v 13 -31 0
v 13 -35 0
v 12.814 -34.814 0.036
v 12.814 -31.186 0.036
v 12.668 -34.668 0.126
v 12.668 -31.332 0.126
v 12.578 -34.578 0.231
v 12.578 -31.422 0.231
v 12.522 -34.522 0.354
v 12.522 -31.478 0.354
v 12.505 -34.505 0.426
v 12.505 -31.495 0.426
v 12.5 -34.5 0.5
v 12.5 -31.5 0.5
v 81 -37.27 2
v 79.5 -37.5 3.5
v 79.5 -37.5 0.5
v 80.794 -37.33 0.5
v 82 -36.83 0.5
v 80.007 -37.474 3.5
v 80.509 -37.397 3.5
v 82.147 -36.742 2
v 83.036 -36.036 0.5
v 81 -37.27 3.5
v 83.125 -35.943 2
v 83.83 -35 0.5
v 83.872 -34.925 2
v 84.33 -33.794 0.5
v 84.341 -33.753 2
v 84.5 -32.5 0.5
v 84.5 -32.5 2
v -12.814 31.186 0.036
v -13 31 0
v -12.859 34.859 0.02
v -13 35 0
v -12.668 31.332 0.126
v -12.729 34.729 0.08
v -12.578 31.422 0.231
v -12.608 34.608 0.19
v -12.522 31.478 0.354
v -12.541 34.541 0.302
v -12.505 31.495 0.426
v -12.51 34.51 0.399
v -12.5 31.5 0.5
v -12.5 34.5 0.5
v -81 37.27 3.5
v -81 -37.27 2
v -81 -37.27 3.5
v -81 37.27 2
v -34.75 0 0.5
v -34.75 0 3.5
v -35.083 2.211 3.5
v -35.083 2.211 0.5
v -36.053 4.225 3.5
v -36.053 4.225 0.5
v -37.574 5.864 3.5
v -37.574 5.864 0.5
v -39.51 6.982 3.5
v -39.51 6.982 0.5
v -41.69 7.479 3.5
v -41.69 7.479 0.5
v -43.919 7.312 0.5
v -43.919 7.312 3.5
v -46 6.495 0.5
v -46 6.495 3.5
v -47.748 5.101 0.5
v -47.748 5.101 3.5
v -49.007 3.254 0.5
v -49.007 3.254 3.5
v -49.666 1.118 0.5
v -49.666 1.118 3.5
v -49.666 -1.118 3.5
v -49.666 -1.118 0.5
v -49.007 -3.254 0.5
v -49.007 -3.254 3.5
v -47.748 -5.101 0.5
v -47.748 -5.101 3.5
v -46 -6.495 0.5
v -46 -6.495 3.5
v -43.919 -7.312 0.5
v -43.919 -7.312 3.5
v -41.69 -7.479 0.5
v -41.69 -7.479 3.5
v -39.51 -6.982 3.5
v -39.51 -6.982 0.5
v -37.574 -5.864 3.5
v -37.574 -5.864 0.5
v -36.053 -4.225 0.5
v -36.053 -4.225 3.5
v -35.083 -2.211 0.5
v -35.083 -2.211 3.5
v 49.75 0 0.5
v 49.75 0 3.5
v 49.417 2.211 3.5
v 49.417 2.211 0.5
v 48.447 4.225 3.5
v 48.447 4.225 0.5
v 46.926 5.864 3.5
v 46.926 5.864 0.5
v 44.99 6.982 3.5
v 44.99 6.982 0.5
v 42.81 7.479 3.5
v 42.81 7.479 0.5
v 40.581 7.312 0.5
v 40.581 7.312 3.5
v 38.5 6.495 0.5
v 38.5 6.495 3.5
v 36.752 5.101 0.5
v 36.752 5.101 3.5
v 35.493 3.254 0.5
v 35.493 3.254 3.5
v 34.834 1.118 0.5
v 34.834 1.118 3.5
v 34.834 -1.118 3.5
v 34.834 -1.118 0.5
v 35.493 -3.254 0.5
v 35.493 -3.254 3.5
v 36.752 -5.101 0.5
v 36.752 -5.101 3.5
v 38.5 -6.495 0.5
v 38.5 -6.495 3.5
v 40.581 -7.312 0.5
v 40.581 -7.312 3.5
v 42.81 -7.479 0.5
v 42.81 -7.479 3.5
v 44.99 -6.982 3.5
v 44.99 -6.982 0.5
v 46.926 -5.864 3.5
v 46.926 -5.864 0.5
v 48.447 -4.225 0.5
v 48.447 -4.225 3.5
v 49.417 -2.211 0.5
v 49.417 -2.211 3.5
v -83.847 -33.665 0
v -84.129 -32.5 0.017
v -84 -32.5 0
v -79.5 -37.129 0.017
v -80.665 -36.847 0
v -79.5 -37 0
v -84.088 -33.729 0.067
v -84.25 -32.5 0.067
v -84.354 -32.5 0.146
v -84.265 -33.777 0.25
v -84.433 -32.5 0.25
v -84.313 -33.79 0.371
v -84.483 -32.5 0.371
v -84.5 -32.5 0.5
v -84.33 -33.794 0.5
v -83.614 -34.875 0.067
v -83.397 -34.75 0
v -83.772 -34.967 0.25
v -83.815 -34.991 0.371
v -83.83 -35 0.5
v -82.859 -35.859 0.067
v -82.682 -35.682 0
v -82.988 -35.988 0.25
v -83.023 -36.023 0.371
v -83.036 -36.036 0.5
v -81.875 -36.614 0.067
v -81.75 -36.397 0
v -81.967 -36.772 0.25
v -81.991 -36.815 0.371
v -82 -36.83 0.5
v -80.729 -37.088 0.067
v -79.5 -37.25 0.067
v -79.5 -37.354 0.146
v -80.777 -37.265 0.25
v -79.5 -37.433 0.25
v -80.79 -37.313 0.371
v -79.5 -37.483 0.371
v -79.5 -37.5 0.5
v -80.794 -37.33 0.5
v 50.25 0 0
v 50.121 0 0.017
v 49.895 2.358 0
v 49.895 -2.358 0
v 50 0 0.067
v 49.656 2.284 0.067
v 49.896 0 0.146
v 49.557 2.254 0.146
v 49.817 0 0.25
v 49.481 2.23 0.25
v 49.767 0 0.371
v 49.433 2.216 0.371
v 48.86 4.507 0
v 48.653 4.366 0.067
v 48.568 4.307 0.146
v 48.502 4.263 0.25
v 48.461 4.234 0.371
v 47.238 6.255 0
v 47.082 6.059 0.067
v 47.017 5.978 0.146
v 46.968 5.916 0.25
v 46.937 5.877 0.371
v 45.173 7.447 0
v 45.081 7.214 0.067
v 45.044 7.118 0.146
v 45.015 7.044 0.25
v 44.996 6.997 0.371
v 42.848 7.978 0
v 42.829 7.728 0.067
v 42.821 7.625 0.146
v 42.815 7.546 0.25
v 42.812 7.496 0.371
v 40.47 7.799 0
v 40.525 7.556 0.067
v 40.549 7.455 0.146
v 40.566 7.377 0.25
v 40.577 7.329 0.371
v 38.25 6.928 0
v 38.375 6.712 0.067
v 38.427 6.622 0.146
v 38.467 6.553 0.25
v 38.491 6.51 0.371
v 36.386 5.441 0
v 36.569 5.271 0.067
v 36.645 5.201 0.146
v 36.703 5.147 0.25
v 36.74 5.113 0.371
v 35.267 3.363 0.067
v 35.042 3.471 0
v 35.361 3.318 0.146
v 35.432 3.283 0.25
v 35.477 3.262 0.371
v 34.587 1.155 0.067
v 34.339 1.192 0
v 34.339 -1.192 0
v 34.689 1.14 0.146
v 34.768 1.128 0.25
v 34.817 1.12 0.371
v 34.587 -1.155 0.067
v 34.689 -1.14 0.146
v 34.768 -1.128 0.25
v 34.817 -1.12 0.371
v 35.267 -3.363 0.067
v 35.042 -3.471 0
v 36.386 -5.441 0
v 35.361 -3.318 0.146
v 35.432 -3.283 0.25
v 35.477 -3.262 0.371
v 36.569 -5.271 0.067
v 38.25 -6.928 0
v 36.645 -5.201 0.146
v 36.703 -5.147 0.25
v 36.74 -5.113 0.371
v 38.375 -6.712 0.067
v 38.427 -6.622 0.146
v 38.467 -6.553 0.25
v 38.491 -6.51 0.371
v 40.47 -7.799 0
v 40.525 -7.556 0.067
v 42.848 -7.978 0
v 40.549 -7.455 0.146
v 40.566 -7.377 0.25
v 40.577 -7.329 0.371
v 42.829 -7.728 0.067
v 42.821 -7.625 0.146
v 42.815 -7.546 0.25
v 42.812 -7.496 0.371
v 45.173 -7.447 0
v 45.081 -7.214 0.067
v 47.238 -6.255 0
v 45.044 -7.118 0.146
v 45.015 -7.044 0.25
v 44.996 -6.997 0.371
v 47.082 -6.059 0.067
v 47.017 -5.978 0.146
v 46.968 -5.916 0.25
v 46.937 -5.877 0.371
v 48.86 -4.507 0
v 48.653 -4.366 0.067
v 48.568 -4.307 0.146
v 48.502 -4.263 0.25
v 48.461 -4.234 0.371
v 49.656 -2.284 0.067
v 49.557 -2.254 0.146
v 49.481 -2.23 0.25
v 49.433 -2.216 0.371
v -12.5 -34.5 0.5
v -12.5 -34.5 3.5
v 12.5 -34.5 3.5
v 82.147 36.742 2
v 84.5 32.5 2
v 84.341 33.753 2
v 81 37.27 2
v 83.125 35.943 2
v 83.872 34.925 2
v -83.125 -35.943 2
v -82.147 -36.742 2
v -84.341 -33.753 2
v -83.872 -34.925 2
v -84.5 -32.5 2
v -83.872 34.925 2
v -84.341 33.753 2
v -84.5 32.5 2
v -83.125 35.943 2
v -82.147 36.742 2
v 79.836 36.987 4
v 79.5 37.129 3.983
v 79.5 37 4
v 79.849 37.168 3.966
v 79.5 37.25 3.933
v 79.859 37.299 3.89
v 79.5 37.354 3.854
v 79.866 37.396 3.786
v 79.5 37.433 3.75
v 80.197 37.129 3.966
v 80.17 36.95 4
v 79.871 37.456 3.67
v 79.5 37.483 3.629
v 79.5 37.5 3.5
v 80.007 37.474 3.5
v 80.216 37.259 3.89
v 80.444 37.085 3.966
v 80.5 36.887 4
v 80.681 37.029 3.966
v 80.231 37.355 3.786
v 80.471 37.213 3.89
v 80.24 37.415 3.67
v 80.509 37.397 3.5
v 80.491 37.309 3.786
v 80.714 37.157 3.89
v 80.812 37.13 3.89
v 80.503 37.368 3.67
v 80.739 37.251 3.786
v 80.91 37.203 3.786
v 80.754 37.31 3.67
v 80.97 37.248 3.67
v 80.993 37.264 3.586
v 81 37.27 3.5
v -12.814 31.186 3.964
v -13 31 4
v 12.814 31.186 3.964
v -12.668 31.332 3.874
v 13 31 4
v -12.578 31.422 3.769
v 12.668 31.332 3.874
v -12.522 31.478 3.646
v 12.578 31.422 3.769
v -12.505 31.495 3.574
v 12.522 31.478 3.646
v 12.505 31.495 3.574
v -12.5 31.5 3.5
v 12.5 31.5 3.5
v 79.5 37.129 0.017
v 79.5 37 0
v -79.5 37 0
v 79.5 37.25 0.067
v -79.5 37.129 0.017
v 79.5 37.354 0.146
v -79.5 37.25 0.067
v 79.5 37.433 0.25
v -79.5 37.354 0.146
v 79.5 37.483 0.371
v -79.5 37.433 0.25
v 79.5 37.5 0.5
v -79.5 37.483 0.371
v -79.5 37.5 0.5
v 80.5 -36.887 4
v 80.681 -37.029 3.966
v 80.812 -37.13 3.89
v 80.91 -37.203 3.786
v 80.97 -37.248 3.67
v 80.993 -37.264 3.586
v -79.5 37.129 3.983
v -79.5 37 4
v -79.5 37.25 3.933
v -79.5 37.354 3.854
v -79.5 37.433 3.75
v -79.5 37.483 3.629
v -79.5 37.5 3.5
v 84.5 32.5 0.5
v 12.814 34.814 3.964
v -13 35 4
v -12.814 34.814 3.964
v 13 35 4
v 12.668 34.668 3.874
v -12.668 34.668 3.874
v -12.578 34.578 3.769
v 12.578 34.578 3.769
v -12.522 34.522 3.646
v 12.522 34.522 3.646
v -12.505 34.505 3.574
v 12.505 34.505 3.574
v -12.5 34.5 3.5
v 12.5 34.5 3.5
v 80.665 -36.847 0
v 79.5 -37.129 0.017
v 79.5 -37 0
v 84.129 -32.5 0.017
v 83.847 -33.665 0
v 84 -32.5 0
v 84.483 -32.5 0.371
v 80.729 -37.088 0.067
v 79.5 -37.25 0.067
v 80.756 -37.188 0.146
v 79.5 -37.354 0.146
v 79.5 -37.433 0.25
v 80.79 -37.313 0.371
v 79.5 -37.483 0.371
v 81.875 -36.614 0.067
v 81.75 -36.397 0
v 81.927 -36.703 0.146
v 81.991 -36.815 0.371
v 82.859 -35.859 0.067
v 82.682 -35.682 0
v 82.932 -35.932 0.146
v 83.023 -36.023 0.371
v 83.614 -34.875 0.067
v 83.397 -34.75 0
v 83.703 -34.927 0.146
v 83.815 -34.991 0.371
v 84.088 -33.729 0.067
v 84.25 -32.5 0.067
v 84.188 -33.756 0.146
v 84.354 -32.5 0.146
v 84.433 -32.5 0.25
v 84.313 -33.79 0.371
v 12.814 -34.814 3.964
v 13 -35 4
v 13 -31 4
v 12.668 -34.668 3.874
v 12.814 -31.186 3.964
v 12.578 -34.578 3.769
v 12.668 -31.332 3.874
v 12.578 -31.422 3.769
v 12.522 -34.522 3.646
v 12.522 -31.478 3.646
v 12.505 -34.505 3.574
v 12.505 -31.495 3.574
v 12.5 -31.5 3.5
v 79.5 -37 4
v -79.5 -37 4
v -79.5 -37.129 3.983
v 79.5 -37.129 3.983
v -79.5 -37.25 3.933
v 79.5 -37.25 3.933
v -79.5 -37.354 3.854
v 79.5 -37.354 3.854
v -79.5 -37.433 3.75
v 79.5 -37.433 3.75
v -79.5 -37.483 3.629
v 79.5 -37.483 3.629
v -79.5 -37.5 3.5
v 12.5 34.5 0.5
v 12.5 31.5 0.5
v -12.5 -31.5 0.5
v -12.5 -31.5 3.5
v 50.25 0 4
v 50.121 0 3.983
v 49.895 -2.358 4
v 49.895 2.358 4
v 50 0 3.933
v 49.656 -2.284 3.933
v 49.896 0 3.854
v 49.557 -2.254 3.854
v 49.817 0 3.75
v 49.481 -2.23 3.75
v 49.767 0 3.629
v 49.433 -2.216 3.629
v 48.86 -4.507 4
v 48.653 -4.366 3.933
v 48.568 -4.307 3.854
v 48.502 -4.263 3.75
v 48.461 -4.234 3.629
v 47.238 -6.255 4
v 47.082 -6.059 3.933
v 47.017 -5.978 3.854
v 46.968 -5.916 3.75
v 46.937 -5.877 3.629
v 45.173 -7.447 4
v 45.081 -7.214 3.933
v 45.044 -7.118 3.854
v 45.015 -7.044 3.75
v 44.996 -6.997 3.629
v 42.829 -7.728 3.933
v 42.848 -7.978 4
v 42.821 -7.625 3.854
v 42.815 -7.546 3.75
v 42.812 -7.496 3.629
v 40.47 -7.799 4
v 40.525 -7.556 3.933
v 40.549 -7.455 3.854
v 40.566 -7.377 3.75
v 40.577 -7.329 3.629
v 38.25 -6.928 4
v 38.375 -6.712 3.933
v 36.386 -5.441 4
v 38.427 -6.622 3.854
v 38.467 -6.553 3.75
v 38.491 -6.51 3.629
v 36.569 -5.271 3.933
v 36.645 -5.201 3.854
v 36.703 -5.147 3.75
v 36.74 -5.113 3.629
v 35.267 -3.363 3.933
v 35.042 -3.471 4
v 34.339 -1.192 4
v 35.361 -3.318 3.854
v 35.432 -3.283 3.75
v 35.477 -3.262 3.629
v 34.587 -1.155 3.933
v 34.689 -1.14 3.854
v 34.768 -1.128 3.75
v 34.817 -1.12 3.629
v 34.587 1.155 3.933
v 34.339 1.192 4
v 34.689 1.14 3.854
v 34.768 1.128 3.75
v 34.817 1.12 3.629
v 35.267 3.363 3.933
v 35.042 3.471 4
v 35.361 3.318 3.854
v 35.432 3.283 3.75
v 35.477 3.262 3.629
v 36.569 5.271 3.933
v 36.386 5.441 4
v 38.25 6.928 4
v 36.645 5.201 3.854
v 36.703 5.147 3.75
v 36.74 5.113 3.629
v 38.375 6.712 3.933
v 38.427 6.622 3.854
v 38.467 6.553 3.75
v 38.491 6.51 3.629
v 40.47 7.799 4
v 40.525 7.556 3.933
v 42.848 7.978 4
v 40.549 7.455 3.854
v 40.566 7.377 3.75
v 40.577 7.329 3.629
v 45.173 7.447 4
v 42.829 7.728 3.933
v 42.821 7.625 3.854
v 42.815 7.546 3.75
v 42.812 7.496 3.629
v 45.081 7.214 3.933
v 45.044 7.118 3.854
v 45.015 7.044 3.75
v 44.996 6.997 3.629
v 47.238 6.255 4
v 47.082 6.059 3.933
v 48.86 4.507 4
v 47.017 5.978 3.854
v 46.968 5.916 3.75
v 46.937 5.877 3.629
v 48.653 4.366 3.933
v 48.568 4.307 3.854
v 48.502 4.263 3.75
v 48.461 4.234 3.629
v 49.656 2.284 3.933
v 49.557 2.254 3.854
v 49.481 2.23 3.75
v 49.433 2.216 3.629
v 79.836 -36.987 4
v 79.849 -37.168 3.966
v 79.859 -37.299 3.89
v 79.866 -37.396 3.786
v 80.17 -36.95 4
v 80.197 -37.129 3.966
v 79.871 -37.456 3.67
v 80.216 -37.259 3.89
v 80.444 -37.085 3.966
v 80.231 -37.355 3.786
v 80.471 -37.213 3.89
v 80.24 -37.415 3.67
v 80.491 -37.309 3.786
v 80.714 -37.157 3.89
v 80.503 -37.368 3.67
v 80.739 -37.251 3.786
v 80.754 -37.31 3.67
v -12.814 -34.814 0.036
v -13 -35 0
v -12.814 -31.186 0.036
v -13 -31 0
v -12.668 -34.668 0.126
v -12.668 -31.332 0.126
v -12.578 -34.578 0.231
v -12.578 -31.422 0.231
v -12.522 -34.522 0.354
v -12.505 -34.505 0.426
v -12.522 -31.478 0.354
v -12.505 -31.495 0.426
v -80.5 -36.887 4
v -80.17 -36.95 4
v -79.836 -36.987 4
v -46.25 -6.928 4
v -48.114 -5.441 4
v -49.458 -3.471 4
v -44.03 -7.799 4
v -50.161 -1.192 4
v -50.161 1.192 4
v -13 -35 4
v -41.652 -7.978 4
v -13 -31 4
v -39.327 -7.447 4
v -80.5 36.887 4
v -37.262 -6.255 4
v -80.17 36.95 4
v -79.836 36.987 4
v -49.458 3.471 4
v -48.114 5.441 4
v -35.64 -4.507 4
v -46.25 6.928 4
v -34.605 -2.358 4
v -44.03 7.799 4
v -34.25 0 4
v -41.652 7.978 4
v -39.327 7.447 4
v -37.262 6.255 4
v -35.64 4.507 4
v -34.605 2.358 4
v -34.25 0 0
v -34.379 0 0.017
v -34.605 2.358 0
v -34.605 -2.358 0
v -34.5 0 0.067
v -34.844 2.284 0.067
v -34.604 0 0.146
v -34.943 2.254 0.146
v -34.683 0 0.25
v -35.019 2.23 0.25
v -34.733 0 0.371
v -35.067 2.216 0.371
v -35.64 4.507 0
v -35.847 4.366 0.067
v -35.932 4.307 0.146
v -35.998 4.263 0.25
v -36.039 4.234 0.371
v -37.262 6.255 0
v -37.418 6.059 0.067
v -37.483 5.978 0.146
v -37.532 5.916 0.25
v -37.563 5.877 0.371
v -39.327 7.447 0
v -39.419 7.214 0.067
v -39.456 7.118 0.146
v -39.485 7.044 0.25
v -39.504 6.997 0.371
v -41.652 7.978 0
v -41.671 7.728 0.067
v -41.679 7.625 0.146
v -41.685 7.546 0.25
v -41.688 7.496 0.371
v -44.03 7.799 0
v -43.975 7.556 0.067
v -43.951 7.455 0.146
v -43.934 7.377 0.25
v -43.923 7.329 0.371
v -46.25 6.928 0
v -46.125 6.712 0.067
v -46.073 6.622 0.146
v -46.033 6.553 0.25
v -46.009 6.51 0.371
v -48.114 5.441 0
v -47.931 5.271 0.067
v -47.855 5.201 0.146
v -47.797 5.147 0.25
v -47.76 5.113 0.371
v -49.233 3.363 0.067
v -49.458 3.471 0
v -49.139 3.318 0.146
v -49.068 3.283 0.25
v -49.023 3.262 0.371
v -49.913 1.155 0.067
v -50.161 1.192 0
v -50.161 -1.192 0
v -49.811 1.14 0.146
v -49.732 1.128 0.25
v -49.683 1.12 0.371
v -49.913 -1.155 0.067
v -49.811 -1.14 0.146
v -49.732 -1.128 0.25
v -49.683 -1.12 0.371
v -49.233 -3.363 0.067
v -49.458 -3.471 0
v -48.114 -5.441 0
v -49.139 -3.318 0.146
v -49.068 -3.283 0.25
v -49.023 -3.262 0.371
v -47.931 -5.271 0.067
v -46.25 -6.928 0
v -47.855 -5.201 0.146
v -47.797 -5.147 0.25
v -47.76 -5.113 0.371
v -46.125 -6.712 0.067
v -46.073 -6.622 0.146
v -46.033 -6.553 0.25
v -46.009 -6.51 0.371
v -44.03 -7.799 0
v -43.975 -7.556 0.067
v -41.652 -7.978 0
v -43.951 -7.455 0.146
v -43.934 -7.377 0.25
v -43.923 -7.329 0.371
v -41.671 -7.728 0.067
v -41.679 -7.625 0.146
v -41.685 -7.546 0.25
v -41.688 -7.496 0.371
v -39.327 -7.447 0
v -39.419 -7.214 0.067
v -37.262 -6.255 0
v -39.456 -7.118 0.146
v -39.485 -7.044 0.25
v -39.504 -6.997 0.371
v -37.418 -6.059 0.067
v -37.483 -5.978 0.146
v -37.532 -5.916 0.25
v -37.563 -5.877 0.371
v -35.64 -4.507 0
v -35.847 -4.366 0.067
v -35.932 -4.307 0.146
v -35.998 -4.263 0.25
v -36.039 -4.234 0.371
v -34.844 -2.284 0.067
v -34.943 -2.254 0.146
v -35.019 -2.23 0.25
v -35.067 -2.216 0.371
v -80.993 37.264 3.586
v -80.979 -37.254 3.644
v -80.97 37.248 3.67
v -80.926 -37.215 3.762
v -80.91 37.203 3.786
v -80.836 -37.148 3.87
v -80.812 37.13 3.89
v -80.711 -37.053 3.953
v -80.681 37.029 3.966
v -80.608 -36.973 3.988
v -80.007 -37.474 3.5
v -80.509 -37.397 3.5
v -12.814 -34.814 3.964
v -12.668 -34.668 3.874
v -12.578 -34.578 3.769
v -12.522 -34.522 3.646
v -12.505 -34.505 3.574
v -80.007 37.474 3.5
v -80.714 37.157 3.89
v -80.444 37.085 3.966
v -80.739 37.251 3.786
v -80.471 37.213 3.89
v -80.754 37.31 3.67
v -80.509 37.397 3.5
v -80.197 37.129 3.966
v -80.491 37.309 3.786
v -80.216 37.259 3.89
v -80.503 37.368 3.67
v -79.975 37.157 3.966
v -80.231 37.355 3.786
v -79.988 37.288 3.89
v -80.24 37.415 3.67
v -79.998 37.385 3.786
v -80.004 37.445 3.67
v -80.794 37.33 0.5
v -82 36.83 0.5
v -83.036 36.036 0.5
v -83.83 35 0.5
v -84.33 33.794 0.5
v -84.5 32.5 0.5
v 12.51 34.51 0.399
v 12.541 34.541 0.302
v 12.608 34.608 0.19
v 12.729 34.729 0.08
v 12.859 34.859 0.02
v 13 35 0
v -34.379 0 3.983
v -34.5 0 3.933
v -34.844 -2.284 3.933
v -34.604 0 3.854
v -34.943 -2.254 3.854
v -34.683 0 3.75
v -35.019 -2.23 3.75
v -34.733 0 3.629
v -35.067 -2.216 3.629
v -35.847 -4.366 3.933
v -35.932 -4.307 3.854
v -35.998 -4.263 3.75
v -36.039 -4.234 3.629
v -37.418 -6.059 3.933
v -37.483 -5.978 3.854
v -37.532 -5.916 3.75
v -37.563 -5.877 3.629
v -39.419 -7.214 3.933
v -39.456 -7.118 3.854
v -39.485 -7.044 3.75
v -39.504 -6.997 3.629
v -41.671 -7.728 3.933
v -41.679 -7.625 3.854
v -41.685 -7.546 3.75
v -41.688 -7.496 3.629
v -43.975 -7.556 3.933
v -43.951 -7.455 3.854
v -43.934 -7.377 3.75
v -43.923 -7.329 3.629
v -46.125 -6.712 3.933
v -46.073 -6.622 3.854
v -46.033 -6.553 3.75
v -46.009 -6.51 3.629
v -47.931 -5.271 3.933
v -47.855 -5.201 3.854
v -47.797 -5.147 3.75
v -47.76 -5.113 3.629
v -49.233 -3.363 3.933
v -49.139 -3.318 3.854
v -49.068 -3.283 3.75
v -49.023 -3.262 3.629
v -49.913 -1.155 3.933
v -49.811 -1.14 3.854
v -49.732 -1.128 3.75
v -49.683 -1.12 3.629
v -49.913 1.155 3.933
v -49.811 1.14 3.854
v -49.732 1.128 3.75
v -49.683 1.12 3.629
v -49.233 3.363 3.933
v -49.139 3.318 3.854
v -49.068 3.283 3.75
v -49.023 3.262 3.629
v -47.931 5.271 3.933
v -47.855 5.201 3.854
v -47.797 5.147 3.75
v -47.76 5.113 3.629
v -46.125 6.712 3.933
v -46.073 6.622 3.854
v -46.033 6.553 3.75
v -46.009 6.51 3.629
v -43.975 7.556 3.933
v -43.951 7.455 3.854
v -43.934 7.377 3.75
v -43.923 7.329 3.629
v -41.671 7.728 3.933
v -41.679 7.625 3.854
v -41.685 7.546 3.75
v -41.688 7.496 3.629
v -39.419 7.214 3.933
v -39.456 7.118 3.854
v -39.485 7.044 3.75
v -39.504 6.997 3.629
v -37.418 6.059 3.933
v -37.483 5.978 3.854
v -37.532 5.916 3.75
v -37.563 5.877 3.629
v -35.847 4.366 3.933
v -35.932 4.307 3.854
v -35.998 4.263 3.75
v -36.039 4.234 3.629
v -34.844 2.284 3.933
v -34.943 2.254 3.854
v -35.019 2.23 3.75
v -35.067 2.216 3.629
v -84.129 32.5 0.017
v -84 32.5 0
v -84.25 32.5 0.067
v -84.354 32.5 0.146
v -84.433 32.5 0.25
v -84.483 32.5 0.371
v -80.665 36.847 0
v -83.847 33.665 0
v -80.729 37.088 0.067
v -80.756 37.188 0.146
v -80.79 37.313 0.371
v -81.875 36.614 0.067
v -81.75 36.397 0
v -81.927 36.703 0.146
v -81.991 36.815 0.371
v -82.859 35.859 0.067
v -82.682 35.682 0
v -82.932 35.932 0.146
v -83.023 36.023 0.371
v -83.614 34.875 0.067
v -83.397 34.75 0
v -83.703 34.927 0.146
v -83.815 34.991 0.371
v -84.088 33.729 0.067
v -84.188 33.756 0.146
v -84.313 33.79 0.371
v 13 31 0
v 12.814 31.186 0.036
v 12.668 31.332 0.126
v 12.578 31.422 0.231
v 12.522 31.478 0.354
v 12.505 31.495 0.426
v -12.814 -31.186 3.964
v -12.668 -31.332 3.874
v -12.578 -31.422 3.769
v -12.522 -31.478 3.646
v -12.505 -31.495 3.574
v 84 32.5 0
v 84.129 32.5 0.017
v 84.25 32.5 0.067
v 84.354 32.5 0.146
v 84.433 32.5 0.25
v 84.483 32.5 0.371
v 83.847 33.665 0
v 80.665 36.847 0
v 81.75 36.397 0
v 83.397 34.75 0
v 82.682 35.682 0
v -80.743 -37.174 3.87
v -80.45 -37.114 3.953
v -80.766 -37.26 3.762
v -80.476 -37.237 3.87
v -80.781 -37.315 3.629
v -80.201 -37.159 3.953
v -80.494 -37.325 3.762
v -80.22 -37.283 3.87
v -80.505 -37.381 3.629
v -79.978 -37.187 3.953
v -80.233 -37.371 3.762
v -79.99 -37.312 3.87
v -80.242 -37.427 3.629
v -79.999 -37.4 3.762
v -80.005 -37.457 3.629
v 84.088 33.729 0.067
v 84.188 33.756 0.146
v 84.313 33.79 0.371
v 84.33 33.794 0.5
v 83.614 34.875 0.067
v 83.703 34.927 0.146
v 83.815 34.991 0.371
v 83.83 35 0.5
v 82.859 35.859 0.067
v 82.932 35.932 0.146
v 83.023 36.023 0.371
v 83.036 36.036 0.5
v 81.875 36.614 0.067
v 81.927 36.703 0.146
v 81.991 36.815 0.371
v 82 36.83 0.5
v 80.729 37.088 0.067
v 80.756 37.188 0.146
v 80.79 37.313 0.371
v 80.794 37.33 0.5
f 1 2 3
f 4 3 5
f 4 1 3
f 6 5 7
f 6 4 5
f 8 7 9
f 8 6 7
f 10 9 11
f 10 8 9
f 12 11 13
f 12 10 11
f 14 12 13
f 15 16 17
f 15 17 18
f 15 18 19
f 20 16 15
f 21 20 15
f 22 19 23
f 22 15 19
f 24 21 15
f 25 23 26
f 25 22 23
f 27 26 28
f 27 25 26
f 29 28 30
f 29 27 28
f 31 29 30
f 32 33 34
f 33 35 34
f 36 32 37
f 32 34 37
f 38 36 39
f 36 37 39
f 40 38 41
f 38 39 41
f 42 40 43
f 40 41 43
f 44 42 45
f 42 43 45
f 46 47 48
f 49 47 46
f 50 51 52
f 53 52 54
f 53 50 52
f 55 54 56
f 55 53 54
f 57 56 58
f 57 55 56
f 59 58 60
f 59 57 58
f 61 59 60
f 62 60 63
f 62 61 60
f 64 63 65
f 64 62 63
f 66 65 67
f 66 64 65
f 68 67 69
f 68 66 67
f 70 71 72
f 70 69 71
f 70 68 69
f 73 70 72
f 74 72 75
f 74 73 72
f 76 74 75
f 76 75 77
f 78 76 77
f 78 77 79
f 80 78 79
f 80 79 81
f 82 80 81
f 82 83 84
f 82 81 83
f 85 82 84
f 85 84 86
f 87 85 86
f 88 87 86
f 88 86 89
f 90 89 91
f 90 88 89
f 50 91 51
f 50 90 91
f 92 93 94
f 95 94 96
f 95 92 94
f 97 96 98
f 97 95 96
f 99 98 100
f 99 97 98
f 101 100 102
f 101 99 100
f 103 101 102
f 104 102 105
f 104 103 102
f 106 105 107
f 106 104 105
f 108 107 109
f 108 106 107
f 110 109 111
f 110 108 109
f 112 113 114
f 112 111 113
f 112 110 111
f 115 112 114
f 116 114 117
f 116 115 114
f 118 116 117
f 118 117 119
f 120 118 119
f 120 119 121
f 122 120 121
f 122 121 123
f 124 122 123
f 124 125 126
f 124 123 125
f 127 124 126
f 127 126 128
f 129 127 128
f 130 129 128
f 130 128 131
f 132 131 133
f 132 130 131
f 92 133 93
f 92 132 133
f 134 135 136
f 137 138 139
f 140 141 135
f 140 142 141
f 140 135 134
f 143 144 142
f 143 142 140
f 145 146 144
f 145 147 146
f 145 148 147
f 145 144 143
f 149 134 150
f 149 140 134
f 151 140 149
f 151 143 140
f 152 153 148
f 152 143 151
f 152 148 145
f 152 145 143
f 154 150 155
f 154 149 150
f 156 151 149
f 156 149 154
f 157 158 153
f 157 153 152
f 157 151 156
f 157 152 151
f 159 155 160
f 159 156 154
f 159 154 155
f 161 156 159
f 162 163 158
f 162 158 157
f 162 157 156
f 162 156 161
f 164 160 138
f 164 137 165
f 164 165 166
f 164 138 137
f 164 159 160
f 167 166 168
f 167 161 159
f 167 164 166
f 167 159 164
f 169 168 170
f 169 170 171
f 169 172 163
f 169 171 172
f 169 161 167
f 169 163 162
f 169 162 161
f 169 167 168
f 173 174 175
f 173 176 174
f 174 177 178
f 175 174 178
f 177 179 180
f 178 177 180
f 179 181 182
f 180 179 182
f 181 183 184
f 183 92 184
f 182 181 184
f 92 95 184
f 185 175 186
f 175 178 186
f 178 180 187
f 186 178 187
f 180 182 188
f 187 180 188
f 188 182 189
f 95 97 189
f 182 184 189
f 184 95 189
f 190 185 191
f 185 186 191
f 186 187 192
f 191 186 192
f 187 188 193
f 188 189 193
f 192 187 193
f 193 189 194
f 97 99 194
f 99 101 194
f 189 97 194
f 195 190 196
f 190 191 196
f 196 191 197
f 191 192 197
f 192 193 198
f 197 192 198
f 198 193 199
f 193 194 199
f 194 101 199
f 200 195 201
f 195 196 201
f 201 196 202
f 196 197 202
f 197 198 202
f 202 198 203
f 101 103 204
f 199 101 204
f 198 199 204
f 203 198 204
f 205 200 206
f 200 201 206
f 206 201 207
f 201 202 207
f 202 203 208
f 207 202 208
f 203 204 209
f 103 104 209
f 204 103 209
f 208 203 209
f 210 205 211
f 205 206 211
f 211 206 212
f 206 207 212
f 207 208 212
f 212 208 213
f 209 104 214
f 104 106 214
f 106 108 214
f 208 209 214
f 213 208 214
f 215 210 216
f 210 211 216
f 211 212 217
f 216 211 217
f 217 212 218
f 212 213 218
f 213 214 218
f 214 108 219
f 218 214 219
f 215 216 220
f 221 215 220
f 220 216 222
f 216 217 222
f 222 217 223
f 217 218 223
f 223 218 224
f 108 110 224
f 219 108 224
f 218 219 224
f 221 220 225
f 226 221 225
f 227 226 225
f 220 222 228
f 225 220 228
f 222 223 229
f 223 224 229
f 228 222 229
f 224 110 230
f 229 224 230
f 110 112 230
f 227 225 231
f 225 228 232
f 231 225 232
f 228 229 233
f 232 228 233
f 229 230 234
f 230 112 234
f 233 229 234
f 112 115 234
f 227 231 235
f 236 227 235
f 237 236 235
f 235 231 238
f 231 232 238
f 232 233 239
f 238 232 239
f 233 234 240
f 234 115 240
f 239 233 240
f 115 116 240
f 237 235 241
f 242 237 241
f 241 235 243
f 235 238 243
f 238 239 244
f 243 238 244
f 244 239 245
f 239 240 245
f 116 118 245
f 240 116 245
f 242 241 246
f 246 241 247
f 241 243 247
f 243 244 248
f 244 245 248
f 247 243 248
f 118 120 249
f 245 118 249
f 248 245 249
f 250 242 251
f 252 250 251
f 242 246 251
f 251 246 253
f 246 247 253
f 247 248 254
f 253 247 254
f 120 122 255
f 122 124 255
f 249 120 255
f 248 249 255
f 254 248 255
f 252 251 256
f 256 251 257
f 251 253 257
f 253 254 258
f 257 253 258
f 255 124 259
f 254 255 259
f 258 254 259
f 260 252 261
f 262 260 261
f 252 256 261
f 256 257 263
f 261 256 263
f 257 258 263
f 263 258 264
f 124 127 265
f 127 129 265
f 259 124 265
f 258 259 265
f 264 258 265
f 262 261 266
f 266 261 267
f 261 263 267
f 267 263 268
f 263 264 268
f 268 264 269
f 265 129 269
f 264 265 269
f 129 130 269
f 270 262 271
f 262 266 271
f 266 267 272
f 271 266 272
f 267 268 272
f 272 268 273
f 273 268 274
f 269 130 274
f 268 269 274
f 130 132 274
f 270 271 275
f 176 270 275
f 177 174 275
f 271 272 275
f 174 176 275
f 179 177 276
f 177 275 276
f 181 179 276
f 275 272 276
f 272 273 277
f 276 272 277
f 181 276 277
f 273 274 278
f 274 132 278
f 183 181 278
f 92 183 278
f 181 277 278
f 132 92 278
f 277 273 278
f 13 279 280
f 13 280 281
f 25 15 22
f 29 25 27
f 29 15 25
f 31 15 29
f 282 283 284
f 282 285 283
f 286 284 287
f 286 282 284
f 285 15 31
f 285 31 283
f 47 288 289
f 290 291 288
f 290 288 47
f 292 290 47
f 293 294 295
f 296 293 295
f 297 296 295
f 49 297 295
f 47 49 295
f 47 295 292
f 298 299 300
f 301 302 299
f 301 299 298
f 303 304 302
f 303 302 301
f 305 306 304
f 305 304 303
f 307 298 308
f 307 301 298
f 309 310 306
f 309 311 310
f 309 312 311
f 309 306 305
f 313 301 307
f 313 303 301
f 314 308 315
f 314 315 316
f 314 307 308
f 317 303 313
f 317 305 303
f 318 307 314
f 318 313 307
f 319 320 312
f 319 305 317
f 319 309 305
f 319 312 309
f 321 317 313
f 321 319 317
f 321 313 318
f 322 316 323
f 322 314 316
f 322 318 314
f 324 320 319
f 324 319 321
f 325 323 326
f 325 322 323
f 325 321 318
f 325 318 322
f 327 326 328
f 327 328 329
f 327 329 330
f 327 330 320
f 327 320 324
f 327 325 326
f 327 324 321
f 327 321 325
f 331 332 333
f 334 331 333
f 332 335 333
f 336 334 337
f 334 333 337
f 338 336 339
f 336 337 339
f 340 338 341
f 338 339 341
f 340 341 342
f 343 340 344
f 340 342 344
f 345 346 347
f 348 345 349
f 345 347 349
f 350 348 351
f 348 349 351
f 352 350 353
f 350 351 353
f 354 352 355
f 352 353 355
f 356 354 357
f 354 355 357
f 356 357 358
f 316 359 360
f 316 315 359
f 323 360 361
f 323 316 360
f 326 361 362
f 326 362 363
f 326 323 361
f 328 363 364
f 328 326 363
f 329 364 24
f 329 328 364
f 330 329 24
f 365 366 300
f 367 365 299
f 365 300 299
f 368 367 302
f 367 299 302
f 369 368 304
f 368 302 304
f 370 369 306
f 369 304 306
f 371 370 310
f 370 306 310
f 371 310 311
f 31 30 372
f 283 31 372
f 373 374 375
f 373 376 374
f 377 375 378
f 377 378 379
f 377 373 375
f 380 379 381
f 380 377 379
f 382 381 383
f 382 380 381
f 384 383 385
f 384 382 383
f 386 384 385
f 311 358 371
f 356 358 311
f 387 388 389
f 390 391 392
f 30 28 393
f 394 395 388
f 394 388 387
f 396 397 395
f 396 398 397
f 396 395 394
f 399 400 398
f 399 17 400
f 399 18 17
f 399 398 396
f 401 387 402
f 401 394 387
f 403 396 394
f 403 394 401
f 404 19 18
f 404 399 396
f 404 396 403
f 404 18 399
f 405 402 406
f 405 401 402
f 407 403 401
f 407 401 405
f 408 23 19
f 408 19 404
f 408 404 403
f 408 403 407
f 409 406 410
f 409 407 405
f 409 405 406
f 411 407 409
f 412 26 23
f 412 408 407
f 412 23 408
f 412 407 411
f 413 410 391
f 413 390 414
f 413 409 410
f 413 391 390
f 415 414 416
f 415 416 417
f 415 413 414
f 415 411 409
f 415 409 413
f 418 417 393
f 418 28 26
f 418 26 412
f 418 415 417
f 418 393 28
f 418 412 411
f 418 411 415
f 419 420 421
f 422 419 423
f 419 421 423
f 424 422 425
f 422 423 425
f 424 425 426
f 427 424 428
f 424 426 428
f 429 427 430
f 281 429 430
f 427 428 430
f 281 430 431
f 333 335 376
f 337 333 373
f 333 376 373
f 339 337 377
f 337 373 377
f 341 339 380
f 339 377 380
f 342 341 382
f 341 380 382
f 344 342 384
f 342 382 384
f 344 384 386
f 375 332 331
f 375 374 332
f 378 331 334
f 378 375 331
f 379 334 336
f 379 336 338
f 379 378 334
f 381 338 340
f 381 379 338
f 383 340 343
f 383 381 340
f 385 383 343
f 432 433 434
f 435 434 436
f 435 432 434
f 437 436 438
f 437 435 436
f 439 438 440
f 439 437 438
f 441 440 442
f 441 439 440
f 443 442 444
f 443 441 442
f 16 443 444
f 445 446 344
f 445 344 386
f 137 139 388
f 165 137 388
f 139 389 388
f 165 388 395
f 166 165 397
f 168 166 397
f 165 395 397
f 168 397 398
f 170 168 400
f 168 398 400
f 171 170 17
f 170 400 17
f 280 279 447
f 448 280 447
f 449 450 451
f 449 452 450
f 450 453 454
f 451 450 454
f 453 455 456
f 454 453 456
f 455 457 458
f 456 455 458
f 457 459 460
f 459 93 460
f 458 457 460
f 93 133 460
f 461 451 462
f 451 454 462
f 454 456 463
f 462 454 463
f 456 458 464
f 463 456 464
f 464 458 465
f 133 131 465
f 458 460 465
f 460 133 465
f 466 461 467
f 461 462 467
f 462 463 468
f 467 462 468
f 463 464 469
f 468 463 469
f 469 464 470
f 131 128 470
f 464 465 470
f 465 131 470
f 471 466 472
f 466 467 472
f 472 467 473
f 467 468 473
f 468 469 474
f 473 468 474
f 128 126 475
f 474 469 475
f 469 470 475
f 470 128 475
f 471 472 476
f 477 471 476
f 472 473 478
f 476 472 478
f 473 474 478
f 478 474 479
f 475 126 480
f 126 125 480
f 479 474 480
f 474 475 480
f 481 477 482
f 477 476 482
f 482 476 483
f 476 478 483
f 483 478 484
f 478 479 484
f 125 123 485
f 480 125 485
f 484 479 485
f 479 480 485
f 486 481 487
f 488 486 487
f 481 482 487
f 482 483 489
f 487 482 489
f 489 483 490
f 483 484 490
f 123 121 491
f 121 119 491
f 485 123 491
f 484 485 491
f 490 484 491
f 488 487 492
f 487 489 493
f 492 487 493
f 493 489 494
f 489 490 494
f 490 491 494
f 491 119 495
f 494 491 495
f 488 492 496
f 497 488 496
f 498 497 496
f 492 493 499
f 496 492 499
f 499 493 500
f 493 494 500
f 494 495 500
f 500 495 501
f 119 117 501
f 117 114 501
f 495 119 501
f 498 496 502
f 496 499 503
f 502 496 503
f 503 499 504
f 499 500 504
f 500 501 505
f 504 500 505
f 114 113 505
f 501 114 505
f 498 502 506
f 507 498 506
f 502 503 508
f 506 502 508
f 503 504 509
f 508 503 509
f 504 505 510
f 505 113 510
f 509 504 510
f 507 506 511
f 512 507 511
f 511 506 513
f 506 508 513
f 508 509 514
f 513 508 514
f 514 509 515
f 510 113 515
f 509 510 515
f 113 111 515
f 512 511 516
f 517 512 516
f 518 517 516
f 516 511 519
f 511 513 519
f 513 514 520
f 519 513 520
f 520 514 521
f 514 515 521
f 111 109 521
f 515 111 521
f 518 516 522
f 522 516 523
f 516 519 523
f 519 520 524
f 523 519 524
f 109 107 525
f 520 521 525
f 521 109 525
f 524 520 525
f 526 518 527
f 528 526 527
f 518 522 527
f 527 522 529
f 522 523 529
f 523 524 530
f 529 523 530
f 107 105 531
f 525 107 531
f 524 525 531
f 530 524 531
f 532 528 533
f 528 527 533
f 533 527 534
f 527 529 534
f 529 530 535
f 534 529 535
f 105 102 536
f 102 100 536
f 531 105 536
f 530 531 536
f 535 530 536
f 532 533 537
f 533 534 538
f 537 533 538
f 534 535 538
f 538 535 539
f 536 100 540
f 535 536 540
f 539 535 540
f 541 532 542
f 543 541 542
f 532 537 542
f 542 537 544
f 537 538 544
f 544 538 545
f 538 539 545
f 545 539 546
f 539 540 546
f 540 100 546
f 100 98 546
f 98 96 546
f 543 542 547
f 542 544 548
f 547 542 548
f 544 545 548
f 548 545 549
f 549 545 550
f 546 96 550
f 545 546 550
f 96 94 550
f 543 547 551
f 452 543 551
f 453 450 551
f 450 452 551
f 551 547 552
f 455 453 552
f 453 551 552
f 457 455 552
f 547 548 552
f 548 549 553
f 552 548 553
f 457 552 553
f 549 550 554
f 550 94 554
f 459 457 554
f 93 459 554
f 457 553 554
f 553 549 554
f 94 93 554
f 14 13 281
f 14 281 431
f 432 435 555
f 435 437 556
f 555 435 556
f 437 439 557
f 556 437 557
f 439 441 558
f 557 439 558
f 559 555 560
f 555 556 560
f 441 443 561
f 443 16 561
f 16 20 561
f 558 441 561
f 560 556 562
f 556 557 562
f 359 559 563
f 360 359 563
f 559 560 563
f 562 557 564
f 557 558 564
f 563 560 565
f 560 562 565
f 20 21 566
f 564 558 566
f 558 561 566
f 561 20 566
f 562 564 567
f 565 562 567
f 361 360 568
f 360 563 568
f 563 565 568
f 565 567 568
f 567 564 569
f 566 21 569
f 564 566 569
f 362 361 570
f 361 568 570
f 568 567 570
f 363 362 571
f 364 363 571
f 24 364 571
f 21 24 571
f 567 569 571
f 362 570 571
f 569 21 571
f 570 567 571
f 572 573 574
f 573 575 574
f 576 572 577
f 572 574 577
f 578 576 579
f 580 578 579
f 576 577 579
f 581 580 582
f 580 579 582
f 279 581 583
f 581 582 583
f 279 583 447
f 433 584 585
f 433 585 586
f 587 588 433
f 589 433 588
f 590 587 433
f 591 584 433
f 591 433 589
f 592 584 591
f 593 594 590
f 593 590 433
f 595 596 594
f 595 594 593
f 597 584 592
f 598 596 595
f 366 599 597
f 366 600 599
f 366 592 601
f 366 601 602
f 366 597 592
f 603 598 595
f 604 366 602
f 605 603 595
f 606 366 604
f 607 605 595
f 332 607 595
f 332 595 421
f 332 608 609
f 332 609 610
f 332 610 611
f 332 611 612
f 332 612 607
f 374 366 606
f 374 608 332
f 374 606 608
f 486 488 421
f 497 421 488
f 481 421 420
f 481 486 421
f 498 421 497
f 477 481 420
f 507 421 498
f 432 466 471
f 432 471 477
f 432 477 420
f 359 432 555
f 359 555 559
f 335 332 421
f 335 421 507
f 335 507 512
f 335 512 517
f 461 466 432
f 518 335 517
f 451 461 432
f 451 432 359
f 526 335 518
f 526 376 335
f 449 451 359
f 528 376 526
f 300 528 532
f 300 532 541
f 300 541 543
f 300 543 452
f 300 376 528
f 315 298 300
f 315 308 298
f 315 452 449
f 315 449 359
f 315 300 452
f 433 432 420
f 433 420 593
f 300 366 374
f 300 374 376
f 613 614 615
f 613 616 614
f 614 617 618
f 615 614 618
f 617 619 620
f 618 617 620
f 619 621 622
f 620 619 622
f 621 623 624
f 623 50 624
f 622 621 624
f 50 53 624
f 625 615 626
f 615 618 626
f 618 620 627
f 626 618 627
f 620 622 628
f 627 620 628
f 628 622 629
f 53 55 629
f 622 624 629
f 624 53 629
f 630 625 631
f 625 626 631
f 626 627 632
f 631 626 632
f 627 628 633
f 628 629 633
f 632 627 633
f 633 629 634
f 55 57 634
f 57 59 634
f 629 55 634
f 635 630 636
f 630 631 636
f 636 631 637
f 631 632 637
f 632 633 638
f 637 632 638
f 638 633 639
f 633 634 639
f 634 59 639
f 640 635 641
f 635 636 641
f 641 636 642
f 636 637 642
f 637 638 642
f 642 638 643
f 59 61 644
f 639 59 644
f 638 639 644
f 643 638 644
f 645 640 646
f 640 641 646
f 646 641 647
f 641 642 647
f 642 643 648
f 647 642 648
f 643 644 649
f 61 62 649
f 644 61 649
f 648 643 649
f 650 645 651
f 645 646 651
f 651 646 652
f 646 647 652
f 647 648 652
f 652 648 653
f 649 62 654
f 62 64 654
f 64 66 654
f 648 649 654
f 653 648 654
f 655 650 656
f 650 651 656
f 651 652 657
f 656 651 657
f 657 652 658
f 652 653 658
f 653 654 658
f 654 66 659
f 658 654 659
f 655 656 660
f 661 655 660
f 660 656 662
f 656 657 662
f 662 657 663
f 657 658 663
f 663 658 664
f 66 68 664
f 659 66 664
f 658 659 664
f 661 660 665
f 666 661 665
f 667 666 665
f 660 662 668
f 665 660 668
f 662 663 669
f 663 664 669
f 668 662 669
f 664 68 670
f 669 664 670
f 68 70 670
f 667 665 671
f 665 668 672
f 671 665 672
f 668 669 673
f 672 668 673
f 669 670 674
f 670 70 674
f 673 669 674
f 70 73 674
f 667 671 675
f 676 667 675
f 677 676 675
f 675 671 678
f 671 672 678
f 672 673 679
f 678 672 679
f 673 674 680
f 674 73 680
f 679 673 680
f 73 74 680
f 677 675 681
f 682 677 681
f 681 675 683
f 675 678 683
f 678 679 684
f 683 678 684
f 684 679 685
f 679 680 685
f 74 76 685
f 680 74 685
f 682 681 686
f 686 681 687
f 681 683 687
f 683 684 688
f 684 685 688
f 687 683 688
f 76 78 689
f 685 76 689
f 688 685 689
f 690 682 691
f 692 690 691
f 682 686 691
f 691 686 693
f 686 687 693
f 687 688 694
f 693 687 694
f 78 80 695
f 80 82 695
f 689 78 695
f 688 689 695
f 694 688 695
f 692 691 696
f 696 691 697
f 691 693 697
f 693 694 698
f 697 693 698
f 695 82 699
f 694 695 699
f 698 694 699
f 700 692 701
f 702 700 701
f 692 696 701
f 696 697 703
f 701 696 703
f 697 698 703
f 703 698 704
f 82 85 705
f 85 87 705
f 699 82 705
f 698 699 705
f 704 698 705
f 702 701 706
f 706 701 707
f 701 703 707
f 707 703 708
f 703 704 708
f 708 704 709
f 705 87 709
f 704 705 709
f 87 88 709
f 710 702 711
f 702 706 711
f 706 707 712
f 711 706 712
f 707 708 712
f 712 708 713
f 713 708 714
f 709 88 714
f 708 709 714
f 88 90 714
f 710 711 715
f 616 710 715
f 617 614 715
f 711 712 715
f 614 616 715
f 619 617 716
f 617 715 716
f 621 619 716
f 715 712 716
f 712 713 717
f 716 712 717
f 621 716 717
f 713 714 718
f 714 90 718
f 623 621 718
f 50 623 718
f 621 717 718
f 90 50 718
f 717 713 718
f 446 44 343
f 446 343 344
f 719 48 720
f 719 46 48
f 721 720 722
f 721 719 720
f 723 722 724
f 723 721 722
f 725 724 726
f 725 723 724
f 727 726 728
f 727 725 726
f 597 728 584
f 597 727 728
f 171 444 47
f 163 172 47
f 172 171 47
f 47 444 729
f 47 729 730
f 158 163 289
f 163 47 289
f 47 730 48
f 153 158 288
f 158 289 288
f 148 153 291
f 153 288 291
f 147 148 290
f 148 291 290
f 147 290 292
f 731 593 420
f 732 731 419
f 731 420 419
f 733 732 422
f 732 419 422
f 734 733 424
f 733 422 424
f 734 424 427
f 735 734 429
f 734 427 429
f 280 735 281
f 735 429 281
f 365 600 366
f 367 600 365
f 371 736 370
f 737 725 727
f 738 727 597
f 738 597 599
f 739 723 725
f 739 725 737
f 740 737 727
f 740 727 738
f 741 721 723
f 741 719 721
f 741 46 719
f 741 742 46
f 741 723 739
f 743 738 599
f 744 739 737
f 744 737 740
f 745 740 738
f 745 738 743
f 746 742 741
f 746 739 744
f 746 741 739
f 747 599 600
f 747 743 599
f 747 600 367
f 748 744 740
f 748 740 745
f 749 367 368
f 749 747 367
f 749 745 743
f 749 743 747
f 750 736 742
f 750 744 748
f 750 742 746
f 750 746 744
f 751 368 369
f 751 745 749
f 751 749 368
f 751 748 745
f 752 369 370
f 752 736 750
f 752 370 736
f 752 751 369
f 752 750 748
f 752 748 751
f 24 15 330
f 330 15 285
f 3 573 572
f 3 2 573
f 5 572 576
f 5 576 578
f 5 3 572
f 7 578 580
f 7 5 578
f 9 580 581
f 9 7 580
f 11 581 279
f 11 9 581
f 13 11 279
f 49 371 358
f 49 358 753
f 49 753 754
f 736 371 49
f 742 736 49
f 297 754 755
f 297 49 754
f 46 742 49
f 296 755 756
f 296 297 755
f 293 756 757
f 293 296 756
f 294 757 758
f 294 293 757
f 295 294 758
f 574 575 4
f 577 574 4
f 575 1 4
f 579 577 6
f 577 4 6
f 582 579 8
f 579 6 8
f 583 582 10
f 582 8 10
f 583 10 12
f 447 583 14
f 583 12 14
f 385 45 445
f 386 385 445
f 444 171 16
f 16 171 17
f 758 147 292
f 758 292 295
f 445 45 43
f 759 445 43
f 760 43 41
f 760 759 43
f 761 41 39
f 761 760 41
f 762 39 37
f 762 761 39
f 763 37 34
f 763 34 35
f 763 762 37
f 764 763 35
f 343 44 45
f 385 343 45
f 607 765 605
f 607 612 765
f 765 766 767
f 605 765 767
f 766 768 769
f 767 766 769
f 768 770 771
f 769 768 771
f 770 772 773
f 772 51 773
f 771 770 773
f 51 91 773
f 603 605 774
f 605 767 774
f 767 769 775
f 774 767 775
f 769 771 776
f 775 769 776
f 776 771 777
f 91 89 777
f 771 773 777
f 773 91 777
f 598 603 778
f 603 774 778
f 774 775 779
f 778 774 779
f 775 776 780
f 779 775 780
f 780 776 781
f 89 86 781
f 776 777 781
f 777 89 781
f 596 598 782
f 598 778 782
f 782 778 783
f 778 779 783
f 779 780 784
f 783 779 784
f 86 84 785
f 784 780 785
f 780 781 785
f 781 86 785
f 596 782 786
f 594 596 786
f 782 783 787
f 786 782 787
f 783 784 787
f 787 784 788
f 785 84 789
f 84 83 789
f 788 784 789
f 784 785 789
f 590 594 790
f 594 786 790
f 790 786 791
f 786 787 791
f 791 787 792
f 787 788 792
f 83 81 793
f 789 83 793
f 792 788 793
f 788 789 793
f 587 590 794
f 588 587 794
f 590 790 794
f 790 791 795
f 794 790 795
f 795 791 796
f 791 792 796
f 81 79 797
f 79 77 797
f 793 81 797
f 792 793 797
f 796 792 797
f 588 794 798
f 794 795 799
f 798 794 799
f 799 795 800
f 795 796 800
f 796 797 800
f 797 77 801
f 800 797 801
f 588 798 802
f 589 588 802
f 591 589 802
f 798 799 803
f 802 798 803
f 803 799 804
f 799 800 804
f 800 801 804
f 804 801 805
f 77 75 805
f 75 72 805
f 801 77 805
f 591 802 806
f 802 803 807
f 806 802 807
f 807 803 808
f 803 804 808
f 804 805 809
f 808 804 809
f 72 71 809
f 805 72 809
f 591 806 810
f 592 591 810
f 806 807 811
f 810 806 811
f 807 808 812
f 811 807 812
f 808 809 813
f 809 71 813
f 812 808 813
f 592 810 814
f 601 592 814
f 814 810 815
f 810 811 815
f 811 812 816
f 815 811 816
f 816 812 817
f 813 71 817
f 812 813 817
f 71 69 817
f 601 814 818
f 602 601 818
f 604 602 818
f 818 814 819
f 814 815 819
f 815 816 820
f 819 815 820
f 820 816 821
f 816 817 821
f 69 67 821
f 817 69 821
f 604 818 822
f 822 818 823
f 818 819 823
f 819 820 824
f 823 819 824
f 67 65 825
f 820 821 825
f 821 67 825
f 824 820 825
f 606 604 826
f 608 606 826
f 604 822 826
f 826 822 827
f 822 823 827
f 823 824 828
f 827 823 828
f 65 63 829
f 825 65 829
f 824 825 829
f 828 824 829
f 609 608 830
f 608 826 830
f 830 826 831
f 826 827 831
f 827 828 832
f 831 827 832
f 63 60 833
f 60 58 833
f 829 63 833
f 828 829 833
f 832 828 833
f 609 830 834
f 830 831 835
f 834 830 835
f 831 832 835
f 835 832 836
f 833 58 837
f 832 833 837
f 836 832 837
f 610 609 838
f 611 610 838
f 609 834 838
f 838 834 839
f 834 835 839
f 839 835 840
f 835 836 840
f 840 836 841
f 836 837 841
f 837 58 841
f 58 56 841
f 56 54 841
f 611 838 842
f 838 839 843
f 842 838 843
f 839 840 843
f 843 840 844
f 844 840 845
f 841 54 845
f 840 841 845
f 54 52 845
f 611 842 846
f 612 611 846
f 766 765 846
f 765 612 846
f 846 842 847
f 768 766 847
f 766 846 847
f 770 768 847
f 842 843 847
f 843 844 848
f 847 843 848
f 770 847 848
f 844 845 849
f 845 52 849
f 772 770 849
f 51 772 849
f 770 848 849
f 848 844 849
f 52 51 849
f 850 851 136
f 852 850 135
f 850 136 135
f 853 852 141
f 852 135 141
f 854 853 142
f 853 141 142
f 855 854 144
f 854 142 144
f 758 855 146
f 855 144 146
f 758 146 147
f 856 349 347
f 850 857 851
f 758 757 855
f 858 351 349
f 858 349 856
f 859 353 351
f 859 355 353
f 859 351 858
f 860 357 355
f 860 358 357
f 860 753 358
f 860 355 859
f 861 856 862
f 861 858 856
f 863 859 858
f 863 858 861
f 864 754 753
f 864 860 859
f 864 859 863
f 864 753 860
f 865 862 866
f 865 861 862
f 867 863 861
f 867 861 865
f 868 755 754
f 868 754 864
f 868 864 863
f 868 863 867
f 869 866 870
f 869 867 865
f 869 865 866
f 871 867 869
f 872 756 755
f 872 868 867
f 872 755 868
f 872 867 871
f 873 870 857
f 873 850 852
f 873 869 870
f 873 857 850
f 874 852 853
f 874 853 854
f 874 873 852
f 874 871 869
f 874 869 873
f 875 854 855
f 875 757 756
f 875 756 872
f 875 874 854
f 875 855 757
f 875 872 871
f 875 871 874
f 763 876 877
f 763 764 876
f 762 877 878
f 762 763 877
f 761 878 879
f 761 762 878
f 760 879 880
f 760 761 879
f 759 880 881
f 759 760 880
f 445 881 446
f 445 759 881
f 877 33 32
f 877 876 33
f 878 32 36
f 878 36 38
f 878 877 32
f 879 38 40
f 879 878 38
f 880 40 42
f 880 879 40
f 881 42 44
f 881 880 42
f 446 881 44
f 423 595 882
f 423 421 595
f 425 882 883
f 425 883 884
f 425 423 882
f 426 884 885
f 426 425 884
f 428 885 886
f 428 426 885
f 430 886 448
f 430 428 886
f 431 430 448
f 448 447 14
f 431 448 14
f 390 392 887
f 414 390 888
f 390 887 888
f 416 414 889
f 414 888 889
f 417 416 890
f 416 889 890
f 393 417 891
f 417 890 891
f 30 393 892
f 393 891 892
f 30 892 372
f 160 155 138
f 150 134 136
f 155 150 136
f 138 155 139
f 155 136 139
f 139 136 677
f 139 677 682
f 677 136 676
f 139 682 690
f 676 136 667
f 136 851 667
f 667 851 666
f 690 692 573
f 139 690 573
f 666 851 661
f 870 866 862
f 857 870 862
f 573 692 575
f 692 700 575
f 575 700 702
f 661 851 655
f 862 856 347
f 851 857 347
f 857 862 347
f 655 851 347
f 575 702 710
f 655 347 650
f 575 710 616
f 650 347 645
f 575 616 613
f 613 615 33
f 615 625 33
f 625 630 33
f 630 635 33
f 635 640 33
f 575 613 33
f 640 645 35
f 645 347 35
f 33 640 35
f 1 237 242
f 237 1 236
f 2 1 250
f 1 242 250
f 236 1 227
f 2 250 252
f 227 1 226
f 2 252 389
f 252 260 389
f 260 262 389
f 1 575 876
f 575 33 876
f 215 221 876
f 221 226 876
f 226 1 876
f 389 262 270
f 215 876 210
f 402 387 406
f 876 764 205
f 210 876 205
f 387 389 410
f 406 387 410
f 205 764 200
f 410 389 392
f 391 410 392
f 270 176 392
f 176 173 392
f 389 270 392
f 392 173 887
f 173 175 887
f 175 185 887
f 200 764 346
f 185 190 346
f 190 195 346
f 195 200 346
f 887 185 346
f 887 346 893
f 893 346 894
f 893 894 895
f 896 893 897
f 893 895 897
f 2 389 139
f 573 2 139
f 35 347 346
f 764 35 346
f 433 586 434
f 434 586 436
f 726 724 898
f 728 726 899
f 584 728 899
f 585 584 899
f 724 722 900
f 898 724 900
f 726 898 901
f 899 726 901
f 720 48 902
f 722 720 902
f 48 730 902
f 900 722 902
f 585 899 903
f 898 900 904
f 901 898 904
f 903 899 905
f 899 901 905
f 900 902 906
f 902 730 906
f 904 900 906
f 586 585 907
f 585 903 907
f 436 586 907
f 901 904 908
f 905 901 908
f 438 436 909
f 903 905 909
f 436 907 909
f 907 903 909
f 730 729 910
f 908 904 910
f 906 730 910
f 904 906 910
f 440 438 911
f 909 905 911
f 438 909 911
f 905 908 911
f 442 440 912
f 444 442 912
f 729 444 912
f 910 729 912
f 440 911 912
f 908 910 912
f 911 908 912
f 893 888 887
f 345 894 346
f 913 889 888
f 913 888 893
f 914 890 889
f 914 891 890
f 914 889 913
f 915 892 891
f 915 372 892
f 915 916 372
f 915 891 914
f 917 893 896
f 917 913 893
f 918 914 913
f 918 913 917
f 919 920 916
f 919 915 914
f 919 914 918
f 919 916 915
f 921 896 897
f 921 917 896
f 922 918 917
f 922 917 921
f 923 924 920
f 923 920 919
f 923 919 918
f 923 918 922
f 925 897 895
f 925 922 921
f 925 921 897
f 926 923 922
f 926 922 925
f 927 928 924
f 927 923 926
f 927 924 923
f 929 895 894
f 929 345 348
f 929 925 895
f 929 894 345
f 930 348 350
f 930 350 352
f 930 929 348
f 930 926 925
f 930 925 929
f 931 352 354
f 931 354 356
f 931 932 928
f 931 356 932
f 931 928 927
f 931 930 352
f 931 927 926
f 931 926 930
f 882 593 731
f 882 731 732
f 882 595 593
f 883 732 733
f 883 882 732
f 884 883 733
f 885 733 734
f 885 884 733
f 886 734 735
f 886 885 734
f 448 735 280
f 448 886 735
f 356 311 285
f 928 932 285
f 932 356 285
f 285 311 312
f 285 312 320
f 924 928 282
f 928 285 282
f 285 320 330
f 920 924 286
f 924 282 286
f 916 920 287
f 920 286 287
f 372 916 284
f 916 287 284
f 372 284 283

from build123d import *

# Parameters (mm, degrees)
F0_W     = 169
F0_H     = 75
F0_R     = 7.5
F1_DEPTH = 2
F2_W     = 162
F2_H     = 75
F2_W_2   = 25
F2_H_2   = 3
F3_DEPTH = 2
F4_R     = 5
F5_DEPTH = 25
F6_DEPTH = 25
F7_R     = 0.5


with BuildPart() as f1:
    # F0 (on Top) → F1 (new body)
    with BuildSketch(Plane.XY):
        Rectangle(F0_W, F0_H)
        with Locations((-42.25, 0)):
            Circle(F0_R, mode=Mode.SUBTRACT)
        with Locations((42.25, 0)):
            Circle(F0_R, mode=Mode.SUBTRACT)
    extrude(amount=F1_DEPTH)

    # F2 (on face) → F3 (join)
    with BuildSketch(Plane.XY.offset(2)):
        Rectangle(F2_W, F2_H)
        with Locations((0, -33)):
            Rectangle(F2_W_2, F2_H_2, mode=Mode.SUBTRACT)
        with Locations((0, 33)):
            Rectangle(F2_W_2, F2_H_2, mode=Mode.SUBTRACT)
    extrude(amount=F3_DEPTH)

    # F4
    f4_edges = [f1.edges().sort_by_distance(p)[0] for p in [
        (-84.5, -37.5, 1),
        (84.5, -37.5, 1),
        (84.5, 37.5, 1),
        (-84.5, 37.5, 1),
    ]]
    fillet(f4_edges, radius=F4_R)

    # F0 (on Top) → F5 (cut)
    with BuildSketch(Plane.XY):
        with Locations((42.25, 0)):
            Circle(F0_R)
        with Locations((-42.25, 0)):
            Circle(F0_R)
    extrude(amount=F5_DEPTH, mode=Mode.SUBTRACT)

    # F2 (on face) → F6 (cut)
    with BuildSketch(Plane.XY.offset(2)):
        with Locations((0, 33)):
            Rectangle(F2_W_2, F2_H_2)
        with Locations((0, -33)):
            Rectangle(F2_W_2, F2_H_2)
    extrude(amount=-F6_DEPTH, mode=Mode.SUBTRACT)

    # F7
    f7_edges = [f1.edges().sort_by_distance(p)[0] for p in [
        (0, 37.5, 4),
        (80.258788, 37.442089, 4),
        (-80.258788, 37.442089, 4),
        (81, 0, 4),
        (-81, 0, 4),
        (80.258788, -37.442089, 4),
        (-80.258788, -37.442089, 4),
        (0, -37.5, 4),
        (-12.5, -33, 4),
        (0, -34.5, 4),
        (0, -31.5, 4),
        (12.5, -33, 4),
        (-49.75, 0, 4),
        (34.75, 0, 4),
        (-12.5, 33, 4),
        (0, 31.5, 4),
        (0, 34.5, 4),
        (12.5, 33, 4),
        (0, -37.5, 0),
        (-83.035534, -36.035534, 0),
        (83.035534, -36.035534, 0),
        (-84.5, 0, 0),
        (84.5, 0, 0),
        (-83.035534, 36.035534, 0),
        (83.035534, 36.035534, 0),
        (0, 37.5, 0),
        (0, -31.5, 0),
        (-12.5, -33, 0),
        (0, -34.5, 0),
        (12.5, -33, 0),
        (-49.75, 0, 0),
        (34.75, 0, 0),
        (0, 34.5, 0),
        (-12.5, 33, 0),
        (0, 31.5, 0),
        (12.5, 33, 0),
    ]]
    fillet(f7_edges, radius=F7_R)


solid = f1.part
